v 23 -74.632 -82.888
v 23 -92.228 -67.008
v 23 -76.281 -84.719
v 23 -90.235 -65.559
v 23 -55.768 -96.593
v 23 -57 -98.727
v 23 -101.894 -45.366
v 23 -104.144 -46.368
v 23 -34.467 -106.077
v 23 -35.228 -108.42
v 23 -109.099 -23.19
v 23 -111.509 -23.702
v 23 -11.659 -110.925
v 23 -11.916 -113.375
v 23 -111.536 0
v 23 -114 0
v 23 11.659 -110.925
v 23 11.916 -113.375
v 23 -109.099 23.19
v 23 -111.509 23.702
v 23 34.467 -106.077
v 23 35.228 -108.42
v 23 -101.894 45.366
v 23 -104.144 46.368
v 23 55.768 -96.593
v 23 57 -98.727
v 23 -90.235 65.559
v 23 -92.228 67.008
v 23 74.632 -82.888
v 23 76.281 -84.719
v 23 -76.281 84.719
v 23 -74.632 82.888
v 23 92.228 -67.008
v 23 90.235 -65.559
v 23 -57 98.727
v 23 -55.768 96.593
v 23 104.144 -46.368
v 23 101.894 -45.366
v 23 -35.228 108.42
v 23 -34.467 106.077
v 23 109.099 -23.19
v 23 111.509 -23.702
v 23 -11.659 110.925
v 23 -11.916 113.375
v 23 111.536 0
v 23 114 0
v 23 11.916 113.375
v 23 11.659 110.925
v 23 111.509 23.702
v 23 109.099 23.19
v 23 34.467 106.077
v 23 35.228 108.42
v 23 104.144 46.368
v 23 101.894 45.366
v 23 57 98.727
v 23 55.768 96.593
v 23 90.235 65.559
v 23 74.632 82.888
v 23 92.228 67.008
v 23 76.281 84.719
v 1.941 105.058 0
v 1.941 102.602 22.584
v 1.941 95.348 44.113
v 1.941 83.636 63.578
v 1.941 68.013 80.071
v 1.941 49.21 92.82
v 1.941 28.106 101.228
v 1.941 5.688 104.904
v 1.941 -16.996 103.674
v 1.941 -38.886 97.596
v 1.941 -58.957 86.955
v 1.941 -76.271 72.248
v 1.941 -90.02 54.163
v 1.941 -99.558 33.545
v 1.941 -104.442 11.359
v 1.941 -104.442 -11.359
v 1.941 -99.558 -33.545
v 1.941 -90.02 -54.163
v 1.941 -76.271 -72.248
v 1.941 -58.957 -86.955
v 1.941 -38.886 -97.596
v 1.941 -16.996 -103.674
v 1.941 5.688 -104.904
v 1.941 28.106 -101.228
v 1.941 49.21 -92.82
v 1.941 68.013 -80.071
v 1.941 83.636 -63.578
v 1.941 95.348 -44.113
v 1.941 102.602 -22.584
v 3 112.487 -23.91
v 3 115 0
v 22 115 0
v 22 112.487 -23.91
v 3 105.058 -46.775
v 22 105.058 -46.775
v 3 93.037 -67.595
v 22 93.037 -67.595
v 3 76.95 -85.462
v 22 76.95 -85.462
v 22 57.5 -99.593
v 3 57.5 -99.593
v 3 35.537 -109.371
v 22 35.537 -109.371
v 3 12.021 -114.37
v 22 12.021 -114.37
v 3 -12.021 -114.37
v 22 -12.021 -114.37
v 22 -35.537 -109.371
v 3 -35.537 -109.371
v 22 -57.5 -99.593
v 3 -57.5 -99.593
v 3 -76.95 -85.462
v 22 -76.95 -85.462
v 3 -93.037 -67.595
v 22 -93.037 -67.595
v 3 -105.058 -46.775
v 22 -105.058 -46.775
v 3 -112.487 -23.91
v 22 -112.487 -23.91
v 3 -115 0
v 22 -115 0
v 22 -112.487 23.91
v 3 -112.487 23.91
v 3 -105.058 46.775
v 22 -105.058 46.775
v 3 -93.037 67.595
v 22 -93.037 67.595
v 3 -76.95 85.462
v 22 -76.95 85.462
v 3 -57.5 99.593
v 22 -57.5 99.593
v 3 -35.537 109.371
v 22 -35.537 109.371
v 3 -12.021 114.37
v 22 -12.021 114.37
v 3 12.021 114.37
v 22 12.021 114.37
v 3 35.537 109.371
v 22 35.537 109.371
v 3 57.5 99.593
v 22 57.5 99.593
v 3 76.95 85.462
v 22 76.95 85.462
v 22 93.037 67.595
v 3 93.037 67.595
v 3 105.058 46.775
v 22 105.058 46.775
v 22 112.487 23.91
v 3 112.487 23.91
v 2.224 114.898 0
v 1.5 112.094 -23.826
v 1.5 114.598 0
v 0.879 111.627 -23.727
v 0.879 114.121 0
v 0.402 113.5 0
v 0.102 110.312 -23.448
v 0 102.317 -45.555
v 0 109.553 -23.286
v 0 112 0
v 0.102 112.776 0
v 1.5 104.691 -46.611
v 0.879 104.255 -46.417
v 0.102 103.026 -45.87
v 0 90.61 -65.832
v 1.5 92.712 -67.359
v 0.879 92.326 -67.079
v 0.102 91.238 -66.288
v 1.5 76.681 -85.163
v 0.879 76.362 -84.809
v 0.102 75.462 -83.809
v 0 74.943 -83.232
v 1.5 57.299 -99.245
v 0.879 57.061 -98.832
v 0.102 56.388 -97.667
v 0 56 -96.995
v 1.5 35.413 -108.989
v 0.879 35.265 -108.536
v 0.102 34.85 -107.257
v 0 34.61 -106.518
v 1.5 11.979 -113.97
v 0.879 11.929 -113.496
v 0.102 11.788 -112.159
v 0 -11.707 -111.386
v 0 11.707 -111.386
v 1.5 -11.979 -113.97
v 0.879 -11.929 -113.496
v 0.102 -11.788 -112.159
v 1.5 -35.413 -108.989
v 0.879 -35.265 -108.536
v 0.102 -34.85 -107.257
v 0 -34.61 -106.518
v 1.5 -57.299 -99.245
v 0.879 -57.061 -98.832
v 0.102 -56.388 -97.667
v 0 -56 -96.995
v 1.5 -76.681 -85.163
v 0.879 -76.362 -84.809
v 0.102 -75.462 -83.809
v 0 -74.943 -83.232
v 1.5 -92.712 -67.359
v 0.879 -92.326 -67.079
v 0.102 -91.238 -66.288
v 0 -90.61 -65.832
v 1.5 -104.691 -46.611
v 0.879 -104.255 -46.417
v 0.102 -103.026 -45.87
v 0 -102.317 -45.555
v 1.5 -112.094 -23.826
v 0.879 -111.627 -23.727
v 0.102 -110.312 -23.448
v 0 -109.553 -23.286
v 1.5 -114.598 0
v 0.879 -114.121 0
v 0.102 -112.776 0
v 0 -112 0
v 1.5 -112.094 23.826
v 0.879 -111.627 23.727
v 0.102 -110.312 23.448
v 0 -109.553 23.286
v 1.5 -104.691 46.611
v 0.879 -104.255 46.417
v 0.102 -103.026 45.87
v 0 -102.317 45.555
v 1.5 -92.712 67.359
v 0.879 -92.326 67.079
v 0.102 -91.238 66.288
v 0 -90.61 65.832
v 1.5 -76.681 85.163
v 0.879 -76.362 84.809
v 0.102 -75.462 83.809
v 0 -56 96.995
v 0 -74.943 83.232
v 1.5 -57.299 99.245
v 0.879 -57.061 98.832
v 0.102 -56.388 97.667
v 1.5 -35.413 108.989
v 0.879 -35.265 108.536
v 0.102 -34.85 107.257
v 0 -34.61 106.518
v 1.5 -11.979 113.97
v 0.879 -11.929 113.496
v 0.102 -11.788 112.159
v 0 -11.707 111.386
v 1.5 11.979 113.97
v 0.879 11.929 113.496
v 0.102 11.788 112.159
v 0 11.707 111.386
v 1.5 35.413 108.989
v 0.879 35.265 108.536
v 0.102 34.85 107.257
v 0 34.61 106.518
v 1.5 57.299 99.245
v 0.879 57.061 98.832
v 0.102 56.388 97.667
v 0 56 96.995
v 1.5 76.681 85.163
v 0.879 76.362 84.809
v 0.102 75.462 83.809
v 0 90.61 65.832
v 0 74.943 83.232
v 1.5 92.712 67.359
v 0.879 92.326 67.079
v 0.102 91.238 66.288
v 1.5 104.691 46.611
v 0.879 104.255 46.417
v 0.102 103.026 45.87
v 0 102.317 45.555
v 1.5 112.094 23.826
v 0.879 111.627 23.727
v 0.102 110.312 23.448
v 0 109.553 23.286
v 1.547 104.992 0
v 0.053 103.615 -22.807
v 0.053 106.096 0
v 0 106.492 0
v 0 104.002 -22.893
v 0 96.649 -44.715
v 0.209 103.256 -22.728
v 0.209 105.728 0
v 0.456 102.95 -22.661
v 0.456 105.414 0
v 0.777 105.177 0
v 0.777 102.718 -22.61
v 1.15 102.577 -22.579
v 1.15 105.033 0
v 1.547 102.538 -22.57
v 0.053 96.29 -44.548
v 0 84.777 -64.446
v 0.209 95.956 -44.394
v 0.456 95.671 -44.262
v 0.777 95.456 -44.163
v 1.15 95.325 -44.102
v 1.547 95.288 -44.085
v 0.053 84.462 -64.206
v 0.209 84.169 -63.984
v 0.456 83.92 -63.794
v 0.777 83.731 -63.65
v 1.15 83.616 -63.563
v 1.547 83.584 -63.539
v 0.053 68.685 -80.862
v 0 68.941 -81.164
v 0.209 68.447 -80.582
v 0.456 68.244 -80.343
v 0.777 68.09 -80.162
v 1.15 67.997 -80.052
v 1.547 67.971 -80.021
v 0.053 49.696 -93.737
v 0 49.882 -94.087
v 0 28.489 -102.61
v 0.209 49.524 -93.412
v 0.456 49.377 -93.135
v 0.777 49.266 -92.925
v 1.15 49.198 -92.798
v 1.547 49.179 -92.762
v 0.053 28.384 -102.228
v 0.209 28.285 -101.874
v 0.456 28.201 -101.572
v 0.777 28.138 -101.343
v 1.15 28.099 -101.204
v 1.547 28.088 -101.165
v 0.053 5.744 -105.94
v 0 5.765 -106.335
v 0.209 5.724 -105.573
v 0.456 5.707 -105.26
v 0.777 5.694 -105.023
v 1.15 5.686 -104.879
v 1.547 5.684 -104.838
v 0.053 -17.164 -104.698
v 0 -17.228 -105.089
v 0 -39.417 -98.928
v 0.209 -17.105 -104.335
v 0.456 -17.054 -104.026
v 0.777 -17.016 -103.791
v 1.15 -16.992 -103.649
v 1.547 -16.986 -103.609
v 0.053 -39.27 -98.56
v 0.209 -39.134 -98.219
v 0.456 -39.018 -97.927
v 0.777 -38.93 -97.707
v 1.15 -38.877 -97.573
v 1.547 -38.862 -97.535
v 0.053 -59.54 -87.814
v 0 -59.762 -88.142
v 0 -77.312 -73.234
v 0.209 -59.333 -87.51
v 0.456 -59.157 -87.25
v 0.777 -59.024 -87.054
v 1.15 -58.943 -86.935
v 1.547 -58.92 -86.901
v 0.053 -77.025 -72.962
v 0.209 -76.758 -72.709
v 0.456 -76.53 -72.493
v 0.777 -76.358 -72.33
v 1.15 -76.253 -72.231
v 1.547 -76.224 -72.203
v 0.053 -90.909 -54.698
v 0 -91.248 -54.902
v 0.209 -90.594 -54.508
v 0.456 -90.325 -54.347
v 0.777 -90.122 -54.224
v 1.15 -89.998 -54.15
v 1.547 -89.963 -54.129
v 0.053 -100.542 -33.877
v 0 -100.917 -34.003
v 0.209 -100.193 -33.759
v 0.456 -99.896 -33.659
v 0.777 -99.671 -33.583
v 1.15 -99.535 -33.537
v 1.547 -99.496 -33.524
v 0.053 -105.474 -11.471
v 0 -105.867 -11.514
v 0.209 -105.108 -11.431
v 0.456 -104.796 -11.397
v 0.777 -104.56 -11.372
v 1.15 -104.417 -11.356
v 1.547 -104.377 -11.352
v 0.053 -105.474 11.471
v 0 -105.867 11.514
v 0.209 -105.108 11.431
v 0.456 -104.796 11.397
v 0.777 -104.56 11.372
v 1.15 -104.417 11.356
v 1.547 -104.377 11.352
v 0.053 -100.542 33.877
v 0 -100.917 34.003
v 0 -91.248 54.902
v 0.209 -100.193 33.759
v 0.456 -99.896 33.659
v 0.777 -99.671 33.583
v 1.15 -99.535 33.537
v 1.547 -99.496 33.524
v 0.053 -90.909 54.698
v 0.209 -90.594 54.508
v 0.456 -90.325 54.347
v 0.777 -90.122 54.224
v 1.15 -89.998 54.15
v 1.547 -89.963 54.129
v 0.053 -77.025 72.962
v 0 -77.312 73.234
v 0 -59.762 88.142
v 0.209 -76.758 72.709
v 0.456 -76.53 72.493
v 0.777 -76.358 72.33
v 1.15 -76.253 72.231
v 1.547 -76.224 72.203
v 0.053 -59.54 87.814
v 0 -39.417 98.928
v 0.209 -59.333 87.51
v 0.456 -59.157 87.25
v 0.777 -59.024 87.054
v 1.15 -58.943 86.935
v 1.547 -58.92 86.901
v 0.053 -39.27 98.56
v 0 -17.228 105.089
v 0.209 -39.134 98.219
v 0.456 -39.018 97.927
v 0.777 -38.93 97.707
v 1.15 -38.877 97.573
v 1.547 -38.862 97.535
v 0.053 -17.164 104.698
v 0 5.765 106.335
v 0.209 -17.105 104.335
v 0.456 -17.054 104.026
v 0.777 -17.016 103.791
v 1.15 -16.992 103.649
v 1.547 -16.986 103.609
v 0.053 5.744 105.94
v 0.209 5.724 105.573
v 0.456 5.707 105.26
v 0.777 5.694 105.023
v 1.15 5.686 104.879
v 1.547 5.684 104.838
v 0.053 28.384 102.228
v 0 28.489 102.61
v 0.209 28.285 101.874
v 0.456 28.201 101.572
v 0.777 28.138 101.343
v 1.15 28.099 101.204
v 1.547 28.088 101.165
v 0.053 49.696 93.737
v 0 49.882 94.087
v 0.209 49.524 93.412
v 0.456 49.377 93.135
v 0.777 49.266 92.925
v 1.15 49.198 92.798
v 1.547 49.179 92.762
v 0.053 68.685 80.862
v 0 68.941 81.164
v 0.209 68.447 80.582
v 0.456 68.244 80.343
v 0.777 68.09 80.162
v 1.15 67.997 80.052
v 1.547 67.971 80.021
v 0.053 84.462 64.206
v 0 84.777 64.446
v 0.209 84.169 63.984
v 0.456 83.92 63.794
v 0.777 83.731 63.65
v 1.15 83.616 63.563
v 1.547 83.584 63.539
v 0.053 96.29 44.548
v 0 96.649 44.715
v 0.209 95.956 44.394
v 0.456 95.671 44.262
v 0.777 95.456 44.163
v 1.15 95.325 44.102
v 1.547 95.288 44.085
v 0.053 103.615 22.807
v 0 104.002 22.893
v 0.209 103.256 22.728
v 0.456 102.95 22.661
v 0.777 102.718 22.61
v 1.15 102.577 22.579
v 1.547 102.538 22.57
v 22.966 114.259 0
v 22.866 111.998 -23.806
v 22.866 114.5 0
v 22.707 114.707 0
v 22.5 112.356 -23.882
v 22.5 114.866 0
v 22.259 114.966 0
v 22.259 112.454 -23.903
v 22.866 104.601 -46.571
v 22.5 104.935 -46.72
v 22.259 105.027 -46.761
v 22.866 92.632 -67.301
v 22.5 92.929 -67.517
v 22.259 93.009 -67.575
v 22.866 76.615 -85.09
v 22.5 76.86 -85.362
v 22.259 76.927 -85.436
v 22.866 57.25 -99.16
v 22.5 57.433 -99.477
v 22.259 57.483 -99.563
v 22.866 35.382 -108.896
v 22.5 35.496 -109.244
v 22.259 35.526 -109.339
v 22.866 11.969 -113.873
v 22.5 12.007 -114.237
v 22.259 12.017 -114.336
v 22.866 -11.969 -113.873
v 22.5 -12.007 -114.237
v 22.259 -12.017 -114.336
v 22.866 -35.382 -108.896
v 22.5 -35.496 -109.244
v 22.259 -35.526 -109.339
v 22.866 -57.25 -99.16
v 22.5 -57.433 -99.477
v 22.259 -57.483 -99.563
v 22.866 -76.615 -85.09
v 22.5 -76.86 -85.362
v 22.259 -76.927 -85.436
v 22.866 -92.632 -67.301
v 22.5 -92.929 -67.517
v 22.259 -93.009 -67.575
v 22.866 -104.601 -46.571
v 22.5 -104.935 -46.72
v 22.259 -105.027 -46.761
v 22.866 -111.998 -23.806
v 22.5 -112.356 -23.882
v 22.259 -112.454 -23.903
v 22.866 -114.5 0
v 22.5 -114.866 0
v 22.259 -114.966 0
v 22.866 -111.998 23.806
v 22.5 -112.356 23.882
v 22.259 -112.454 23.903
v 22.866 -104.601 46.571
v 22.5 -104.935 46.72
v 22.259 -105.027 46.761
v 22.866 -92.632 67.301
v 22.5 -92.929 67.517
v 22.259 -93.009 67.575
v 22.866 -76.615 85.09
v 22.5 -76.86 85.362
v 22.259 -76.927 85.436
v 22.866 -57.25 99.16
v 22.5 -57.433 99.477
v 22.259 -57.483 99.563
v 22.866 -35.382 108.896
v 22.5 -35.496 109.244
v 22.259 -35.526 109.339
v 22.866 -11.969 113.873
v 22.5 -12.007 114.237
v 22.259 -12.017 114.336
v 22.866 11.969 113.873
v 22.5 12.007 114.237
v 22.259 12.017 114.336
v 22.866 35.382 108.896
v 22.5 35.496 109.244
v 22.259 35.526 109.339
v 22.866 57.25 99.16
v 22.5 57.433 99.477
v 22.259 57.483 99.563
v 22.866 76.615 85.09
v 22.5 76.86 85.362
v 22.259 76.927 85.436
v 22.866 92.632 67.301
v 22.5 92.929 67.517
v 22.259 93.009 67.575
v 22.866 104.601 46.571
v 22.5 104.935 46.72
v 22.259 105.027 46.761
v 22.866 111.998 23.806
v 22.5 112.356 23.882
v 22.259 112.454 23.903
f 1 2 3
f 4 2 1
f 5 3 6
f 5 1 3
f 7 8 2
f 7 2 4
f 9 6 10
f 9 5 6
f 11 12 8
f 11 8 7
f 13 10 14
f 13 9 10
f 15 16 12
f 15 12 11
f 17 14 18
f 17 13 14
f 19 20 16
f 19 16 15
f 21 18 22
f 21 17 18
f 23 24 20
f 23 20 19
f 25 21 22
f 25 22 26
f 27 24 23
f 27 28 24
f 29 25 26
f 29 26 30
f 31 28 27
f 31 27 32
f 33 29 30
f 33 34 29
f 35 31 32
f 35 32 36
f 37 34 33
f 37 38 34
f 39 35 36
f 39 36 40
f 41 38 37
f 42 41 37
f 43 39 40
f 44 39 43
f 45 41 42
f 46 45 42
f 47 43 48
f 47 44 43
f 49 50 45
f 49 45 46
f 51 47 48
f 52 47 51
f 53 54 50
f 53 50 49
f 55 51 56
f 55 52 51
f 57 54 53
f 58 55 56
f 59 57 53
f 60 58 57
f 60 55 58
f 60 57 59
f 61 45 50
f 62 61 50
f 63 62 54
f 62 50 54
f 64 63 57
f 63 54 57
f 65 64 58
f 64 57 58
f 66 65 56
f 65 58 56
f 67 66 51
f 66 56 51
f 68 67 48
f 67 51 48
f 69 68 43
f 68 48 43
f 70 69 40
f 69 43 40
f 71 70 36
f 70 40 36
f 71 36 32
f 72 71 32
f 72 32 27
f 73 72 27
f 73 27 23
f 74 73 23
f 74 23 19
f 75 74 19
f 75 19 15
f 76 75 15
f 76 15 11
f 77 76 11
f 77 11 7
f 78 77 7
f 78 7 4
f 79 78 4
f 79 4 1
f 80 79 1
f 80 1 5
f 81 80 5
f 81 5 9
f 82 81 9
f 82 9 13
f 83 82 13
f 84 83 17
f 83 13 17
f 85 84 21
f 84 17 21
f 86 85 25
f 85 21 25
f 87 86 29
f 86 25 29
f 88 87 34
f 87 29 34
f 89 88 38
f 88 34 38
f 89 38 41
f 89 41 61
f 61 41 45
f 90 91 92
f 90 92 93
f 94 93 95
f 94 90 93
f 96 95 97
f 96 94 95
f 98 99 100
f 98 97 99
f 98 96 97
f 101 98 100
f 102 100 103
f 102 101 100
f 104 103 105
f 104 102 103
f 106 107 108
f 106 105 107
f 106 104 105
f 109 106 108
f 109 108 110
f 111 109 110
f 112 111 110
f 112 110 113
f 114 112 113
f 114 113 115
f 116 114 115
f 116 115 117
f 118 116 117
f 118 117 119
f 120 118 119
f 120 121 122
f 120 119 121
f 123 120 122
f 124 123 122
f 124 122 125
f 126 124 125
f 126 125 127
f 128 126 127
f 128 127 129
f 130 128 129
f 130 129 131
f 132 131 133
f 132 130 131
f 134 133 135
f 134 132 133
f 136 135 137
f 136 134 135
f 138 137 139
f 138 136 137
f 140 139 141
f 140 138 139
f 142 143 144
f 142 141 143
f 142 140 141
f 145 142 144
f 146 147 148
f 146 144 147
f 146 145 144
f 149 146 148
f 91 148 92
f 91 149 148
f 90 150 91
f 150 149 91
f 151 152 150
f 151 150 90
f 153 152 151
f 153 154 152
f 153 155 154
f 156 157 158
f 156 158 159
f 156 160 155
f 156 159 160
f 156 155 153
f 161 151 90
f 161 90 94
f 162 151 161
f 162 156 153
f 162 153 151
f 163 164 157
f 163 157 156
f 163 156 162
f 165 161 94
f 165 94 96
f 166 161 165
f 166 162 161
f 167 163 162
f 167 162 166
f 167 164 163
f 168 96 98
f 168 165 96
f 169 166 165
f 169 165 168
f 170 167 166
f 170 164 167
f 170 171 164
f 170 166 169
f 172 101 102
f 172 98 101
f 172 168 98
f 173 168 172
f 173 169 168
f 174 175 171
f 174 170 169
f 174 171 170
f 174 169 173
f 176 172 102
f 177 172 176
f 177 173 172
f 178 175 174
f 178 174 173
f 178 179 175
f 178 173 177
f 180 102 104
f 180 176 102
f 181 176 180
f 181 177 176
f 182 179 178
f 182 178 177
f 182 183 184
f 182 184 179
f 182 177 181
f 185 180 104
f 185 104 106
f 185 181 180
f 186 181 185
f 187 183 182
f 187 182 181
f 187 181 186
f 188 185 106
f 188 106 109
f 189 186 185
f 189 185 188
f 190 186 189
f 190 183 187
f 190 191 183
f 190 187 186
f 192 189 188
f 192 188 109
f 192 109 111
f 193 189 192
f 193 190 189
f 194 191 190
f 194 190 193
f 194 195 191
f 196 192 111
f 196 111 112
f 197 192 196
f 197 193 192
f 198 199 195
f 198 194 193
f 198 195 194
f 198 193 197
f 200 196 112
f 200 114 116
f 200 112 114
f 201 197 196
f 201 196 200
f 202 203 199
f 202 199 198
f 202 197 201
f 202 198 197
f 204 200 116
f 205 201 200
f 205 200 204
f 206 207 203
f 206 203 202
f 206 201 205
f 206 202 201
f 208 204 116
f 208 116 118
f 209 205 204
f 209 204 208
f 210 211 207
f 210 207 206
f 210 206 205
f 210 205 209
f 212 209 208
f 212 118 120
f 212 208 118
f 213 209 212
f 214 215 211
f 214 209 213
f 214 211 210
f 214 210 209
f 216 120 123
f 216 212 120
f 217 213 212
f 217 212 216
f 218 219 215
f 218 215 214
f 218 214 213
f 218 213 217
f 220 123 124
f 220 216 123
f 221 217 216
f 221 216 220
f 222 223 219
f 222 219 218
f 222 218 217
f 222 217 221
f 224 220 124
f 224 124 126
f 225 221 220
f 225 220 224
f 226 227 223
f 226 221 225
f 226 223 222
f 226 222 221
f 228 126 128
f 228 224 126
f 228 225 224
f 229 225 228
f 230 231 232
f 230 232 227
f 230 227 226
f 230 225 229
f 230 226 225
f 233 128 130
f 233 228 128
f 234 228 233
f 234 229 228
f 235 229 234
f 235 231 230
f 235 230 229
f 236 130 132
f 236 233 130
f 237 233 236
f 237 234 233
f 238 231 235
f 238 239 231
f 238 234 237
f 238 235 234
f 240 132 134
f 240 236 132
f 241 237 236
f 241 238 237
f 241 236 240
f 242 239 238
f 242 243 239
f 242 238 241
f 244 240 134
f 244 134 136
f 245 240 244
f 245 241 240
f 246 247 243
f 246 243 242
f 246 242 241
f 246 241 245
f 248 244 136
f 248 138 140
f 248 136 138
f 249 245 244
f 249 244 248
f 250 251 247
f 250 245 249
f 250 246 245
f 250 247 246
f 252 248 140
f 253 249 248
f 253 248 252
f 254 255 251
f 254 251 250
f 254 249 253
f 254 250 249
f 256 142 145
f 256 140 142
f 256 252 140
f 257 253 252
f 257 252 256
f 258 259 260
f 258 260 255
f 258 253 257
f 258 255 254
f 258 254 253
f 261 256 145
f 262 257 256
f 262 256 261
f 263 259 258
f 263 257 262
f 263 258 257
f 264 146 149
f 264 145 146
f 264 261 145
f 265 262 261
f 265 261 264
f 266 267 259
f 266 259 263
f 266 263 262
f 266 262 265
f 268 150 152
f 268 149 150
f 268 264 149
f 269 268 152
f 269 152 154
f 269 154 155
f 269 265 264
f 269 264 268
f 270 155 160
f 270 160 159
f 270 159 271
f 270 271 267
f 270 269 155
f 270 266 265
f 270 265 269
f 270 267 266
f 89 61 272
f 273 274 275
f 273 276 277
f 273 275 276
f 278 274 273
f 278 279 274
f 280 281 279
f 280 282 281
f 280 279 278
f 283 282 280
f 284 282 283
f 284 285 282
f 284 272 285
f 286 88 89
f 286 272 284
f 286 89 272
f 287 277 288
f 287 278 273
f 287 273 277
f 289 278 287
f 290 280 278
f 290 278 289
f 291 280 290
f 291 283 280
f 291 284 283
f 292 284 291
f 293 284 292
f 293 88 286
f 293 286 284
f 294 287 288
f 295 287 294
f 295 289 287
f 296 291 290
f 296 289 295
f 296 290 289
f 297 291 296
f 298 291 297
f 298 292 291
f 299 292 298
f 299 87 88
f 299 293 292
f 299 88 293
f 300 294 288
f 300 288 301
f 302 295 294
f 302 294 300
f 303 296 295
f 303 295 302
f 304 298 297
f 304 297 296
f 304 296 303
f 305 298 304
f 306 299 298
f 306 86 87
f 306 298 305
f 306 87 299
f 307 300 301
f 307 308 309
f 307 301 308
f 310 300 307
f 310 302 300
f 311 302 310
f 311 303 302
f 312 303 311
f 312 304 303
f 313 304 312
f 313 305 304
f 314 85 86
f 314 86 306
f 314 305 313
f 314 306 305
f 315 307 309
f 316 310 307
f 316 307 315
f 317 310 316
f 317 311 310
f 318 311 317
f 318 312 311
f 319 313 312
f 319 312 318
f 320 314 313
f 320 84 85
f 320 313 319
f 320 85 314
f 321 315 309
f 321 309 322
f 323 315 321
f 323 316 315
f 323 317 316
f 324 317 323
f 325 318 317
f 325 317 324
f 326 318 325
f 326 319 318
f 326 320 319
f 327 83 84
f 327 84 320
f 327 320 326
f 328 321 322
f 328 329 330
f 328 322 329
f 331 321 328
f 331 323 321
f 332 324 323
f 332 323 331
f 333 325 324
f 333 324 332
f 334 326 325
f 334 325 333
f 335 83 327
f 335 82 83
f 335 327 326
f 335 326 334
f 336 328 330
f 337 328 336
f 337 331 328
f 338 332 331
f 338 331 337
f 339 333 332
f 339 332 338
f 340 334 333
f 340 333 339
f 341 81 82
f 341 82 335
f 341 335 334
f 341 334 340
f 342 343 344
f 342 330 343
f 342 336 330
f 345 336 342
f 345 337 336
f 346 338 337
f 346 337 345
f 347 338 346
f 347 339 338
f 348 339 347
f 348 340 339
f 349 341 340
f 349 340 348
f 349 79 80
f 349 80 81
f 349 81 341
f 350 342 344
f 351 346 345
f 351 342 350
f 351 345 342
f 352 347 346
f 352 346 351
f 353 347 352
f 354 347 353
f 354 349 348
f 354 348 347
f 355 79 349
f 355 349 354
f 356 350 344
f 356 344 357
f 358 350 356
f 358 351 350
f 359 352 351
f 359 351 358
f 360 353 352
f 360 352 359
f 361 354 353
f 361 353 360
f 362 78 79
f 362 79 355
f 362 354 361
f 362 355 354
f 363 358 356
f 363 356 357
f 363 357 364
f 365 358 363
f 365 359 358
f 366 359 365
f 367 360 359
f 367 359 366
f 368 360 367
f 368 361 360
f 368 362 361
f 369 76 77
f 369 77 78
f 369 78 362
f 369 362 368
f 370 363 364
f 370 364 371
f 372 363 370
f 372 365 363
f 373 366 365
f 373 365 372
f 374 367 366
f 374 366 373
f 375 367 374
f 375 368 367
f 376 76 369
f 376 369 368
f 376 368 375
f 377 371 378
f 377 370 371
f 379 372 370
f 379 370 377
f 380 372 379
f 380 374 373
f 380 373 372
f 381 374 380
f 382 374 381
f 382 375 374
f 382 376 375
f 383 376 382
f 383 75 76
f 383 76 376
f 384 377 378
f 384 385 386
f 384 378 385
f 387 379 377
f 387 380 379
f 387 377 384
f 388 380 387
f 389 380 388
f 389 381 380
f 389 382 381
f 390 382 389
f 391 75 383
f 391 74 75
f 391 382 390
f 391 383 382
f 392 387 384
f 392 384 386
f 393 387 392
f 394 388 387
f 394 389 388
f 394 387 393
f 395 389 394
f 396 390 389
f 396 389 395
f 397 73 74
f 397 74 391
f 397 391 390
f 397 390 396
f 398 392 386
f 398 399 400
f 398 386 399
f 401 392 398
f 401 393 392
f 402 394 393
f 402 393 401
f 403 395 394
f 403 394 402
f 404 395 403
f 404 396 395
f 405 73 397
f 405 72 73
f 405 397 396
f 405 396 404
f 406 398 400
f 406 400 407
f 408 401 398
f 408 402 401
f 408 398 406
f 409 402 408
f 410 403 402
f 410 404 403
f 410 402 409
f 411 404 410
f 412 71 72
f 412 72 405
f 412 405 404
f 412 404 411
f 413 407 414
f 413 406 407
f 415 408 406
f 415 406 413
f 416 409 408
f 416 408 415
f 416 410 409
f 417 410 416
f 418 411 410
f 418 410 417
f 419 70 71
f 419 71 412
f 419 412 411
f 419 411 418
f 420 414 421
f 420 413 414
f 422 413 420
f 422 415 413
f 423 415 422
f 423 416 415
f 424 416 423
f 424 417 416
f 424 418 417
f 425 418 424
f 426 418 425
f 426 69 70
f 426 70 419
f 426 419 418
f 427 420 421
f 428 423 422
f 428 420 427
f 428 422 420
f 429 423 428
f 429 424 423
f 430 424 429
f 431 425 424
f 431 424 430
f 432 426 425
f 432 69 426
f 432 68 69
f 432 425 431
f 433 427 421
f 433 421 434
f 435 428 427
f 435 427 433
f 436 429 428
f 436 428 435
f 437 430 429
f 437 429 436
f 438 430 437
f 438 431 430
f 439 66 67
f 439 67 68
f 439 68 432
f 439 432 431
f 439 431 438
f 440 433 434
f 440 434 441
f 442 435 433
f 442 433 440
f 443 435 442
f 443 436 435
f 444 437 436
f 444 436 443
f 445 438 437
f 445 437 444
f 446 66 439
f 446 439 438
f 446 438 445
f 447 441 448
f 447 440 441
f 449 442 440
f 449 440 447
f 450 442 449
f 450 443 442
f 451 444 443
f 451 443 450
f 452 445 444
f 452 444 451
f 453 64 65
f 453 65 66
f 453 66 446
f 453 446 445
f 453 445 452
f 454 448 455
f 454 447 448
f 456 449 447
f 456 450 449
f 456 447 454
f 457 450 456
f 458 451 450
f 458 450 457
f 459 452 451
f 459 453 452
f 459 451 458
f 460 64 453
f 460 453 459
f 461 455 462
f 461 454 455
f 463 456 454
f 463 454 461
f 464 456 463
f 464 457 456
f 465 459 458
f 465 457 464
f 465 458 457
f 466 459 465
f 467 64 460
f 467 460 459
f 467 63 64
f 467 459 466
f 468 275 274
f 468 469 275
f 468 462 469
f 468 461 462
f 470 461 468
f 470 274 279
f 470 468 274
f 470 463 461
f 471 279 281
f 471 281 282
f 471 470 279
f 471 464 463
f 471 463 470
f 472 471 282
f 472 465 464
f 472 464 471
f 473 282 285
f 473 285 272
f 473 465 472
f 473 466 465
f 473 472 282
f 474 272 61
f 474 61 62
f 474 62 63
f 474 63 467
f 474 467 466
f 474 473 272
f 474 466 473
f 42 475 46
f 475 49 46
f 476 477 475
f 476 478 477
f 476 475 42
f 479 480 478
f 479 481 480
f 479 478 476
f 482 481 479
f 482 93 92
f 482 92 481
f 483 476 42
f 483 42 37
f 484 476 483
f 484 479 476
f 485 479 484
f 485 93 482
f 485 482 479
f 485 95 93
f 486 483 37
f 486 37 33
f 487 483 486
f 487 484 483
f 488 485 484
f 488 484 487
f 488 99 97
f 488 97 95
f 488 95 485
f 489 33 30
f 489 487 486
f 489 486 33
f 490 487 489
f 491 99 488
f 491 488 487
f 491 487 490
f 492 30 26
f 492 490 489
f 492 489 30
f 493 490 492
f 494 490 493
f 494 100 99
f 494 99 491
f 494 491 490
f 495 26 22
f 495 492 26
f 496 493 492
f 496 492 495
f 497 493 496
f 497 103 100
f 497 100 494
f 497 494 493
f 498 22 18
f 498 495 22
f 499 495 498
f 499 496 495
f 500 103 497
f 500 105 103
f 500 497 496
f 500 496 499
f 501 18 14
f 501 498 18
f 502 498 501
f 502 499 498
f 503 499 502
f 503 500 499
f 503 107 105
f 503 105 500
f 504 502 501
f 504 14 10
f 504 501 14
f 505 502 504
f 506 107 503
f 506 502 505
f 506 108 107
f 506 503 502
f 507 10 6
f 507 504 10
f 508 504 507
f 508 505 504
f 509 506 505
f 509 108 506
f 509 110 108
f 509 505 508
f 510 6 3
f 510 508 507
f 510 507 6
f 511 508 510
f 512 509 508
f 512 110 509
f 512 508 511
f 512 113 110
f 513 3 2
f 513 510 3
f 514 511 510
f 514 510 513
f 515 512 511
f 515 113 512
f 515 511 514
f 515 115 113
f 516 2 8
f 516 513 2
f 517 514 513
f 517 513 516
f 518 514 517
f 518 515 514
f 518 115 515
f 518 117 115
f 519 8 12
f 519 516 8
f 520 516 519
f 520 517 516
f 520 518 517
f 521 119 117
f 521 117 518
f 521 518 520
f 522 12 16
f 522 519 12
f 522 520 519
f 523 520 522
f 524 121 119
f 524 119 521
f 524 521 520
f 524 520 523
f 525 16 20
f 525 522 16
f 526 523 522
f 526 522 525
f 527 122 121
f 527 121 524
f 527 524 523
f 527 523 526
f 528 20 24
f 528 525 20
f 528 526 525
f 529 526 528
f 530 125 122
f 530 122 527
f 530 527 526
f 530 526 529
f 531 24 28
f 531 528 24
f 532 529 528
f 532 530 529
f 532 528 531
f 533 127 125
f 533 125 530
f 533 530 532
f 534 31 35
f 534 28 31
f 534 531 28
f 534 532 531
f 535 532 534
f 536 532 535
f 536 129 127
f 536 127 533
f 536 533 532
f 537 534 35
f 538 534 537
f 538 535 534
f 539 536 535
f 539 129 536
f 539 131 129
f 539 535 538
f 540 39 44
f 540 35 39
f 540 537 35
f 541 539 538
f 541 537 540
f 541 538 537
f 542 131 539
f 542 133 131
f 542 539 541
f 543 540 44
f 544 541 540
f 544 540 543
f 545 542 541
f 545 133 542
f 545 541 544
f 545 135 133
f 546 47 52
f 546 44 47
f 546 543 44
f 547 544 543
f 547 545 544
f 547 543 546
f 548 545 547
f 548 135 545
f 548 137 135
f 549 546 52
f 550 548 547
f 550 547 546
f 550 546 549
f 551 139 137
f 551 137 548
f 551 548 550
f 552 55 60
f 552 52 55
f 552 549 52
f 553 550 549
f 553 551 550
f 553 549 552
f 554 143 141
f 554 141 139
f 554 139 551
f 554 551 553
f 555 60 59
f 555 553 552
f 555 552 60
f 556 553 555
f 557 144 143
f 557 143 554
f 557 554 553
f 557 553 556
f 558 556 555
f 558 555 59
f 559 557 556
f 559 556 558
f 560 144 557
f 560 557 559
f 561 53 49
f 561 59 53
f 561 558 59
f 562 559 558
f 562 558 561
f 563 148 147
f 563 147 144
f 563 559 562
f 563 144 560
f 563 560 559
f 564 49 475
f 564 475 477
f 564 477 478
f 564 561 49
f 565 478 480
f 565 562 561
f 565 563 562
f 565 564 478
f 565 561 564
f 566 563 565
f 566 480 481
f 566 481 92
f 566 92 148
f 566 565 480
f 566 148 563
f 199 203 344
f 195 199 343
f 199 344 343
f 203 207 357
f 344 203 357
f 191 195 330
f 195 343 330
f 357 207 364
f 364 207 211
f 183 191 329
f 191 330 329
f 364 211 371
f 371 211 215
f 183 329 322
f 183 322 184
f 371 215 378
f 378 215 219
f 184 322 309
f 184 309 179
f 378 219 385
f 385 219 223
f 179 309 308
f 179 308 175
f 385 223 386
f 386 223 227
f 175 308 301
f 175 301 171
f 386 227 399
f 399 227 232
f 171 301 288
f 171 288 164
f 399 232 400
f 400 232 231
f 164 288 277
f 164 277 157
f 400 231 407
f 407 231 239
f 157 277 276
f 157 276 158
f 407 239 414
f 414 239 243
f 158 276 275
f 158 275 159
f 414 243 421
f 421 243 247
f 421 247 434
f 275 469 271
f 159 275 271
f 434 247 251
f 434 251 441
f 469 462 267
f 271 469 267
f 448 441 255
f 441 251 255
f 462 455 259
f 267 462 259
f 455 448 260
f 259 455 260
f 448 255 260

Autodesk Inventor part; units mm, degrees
sketch "Sketch_1" plane through (0, 0, 0) normal (0, 0, 1) x (1, 0, 0)
  line L0 (23, 0) -> (-23, 0)
  arc A0 (0, 106.4915) -> (1.9411, 105.0578) centre (1.5, 106.4915) ccw
  line L1 (1.9411, 105.0578) -> (23, 111.5364)
  line L2 (23, 111.5364) -> (23, 114)
  arc A1 (23, 114) -> (22, 115) centre (22, 114) ccw
  line L3 (22, 115) -> (3, 115)
  arc A2 (3, 115) -> (0, 112) centre (3, 112) ccw
  line L4 (0, 112) -> (0, 106.4915)
revolve "Revolution1" add sketch "Sketch_1" angle 360 about axis through (23, 0, 0) along (1, 0, 0)
ref_plane "outer_ring_XY" through (0, 0, 0) normal (0, 0, 1) x (1, 0, 0)
ref_plane "outer_ring_YZ" through (0, 0, 0) normal (1, 0, 0) x (0, 1, 0)
ref_plane "outer_ring_ZX" through (0, 0, 0) normal (0, 1, 0) x (0, 0, 1)
properties part number "T4DB 170_or"
